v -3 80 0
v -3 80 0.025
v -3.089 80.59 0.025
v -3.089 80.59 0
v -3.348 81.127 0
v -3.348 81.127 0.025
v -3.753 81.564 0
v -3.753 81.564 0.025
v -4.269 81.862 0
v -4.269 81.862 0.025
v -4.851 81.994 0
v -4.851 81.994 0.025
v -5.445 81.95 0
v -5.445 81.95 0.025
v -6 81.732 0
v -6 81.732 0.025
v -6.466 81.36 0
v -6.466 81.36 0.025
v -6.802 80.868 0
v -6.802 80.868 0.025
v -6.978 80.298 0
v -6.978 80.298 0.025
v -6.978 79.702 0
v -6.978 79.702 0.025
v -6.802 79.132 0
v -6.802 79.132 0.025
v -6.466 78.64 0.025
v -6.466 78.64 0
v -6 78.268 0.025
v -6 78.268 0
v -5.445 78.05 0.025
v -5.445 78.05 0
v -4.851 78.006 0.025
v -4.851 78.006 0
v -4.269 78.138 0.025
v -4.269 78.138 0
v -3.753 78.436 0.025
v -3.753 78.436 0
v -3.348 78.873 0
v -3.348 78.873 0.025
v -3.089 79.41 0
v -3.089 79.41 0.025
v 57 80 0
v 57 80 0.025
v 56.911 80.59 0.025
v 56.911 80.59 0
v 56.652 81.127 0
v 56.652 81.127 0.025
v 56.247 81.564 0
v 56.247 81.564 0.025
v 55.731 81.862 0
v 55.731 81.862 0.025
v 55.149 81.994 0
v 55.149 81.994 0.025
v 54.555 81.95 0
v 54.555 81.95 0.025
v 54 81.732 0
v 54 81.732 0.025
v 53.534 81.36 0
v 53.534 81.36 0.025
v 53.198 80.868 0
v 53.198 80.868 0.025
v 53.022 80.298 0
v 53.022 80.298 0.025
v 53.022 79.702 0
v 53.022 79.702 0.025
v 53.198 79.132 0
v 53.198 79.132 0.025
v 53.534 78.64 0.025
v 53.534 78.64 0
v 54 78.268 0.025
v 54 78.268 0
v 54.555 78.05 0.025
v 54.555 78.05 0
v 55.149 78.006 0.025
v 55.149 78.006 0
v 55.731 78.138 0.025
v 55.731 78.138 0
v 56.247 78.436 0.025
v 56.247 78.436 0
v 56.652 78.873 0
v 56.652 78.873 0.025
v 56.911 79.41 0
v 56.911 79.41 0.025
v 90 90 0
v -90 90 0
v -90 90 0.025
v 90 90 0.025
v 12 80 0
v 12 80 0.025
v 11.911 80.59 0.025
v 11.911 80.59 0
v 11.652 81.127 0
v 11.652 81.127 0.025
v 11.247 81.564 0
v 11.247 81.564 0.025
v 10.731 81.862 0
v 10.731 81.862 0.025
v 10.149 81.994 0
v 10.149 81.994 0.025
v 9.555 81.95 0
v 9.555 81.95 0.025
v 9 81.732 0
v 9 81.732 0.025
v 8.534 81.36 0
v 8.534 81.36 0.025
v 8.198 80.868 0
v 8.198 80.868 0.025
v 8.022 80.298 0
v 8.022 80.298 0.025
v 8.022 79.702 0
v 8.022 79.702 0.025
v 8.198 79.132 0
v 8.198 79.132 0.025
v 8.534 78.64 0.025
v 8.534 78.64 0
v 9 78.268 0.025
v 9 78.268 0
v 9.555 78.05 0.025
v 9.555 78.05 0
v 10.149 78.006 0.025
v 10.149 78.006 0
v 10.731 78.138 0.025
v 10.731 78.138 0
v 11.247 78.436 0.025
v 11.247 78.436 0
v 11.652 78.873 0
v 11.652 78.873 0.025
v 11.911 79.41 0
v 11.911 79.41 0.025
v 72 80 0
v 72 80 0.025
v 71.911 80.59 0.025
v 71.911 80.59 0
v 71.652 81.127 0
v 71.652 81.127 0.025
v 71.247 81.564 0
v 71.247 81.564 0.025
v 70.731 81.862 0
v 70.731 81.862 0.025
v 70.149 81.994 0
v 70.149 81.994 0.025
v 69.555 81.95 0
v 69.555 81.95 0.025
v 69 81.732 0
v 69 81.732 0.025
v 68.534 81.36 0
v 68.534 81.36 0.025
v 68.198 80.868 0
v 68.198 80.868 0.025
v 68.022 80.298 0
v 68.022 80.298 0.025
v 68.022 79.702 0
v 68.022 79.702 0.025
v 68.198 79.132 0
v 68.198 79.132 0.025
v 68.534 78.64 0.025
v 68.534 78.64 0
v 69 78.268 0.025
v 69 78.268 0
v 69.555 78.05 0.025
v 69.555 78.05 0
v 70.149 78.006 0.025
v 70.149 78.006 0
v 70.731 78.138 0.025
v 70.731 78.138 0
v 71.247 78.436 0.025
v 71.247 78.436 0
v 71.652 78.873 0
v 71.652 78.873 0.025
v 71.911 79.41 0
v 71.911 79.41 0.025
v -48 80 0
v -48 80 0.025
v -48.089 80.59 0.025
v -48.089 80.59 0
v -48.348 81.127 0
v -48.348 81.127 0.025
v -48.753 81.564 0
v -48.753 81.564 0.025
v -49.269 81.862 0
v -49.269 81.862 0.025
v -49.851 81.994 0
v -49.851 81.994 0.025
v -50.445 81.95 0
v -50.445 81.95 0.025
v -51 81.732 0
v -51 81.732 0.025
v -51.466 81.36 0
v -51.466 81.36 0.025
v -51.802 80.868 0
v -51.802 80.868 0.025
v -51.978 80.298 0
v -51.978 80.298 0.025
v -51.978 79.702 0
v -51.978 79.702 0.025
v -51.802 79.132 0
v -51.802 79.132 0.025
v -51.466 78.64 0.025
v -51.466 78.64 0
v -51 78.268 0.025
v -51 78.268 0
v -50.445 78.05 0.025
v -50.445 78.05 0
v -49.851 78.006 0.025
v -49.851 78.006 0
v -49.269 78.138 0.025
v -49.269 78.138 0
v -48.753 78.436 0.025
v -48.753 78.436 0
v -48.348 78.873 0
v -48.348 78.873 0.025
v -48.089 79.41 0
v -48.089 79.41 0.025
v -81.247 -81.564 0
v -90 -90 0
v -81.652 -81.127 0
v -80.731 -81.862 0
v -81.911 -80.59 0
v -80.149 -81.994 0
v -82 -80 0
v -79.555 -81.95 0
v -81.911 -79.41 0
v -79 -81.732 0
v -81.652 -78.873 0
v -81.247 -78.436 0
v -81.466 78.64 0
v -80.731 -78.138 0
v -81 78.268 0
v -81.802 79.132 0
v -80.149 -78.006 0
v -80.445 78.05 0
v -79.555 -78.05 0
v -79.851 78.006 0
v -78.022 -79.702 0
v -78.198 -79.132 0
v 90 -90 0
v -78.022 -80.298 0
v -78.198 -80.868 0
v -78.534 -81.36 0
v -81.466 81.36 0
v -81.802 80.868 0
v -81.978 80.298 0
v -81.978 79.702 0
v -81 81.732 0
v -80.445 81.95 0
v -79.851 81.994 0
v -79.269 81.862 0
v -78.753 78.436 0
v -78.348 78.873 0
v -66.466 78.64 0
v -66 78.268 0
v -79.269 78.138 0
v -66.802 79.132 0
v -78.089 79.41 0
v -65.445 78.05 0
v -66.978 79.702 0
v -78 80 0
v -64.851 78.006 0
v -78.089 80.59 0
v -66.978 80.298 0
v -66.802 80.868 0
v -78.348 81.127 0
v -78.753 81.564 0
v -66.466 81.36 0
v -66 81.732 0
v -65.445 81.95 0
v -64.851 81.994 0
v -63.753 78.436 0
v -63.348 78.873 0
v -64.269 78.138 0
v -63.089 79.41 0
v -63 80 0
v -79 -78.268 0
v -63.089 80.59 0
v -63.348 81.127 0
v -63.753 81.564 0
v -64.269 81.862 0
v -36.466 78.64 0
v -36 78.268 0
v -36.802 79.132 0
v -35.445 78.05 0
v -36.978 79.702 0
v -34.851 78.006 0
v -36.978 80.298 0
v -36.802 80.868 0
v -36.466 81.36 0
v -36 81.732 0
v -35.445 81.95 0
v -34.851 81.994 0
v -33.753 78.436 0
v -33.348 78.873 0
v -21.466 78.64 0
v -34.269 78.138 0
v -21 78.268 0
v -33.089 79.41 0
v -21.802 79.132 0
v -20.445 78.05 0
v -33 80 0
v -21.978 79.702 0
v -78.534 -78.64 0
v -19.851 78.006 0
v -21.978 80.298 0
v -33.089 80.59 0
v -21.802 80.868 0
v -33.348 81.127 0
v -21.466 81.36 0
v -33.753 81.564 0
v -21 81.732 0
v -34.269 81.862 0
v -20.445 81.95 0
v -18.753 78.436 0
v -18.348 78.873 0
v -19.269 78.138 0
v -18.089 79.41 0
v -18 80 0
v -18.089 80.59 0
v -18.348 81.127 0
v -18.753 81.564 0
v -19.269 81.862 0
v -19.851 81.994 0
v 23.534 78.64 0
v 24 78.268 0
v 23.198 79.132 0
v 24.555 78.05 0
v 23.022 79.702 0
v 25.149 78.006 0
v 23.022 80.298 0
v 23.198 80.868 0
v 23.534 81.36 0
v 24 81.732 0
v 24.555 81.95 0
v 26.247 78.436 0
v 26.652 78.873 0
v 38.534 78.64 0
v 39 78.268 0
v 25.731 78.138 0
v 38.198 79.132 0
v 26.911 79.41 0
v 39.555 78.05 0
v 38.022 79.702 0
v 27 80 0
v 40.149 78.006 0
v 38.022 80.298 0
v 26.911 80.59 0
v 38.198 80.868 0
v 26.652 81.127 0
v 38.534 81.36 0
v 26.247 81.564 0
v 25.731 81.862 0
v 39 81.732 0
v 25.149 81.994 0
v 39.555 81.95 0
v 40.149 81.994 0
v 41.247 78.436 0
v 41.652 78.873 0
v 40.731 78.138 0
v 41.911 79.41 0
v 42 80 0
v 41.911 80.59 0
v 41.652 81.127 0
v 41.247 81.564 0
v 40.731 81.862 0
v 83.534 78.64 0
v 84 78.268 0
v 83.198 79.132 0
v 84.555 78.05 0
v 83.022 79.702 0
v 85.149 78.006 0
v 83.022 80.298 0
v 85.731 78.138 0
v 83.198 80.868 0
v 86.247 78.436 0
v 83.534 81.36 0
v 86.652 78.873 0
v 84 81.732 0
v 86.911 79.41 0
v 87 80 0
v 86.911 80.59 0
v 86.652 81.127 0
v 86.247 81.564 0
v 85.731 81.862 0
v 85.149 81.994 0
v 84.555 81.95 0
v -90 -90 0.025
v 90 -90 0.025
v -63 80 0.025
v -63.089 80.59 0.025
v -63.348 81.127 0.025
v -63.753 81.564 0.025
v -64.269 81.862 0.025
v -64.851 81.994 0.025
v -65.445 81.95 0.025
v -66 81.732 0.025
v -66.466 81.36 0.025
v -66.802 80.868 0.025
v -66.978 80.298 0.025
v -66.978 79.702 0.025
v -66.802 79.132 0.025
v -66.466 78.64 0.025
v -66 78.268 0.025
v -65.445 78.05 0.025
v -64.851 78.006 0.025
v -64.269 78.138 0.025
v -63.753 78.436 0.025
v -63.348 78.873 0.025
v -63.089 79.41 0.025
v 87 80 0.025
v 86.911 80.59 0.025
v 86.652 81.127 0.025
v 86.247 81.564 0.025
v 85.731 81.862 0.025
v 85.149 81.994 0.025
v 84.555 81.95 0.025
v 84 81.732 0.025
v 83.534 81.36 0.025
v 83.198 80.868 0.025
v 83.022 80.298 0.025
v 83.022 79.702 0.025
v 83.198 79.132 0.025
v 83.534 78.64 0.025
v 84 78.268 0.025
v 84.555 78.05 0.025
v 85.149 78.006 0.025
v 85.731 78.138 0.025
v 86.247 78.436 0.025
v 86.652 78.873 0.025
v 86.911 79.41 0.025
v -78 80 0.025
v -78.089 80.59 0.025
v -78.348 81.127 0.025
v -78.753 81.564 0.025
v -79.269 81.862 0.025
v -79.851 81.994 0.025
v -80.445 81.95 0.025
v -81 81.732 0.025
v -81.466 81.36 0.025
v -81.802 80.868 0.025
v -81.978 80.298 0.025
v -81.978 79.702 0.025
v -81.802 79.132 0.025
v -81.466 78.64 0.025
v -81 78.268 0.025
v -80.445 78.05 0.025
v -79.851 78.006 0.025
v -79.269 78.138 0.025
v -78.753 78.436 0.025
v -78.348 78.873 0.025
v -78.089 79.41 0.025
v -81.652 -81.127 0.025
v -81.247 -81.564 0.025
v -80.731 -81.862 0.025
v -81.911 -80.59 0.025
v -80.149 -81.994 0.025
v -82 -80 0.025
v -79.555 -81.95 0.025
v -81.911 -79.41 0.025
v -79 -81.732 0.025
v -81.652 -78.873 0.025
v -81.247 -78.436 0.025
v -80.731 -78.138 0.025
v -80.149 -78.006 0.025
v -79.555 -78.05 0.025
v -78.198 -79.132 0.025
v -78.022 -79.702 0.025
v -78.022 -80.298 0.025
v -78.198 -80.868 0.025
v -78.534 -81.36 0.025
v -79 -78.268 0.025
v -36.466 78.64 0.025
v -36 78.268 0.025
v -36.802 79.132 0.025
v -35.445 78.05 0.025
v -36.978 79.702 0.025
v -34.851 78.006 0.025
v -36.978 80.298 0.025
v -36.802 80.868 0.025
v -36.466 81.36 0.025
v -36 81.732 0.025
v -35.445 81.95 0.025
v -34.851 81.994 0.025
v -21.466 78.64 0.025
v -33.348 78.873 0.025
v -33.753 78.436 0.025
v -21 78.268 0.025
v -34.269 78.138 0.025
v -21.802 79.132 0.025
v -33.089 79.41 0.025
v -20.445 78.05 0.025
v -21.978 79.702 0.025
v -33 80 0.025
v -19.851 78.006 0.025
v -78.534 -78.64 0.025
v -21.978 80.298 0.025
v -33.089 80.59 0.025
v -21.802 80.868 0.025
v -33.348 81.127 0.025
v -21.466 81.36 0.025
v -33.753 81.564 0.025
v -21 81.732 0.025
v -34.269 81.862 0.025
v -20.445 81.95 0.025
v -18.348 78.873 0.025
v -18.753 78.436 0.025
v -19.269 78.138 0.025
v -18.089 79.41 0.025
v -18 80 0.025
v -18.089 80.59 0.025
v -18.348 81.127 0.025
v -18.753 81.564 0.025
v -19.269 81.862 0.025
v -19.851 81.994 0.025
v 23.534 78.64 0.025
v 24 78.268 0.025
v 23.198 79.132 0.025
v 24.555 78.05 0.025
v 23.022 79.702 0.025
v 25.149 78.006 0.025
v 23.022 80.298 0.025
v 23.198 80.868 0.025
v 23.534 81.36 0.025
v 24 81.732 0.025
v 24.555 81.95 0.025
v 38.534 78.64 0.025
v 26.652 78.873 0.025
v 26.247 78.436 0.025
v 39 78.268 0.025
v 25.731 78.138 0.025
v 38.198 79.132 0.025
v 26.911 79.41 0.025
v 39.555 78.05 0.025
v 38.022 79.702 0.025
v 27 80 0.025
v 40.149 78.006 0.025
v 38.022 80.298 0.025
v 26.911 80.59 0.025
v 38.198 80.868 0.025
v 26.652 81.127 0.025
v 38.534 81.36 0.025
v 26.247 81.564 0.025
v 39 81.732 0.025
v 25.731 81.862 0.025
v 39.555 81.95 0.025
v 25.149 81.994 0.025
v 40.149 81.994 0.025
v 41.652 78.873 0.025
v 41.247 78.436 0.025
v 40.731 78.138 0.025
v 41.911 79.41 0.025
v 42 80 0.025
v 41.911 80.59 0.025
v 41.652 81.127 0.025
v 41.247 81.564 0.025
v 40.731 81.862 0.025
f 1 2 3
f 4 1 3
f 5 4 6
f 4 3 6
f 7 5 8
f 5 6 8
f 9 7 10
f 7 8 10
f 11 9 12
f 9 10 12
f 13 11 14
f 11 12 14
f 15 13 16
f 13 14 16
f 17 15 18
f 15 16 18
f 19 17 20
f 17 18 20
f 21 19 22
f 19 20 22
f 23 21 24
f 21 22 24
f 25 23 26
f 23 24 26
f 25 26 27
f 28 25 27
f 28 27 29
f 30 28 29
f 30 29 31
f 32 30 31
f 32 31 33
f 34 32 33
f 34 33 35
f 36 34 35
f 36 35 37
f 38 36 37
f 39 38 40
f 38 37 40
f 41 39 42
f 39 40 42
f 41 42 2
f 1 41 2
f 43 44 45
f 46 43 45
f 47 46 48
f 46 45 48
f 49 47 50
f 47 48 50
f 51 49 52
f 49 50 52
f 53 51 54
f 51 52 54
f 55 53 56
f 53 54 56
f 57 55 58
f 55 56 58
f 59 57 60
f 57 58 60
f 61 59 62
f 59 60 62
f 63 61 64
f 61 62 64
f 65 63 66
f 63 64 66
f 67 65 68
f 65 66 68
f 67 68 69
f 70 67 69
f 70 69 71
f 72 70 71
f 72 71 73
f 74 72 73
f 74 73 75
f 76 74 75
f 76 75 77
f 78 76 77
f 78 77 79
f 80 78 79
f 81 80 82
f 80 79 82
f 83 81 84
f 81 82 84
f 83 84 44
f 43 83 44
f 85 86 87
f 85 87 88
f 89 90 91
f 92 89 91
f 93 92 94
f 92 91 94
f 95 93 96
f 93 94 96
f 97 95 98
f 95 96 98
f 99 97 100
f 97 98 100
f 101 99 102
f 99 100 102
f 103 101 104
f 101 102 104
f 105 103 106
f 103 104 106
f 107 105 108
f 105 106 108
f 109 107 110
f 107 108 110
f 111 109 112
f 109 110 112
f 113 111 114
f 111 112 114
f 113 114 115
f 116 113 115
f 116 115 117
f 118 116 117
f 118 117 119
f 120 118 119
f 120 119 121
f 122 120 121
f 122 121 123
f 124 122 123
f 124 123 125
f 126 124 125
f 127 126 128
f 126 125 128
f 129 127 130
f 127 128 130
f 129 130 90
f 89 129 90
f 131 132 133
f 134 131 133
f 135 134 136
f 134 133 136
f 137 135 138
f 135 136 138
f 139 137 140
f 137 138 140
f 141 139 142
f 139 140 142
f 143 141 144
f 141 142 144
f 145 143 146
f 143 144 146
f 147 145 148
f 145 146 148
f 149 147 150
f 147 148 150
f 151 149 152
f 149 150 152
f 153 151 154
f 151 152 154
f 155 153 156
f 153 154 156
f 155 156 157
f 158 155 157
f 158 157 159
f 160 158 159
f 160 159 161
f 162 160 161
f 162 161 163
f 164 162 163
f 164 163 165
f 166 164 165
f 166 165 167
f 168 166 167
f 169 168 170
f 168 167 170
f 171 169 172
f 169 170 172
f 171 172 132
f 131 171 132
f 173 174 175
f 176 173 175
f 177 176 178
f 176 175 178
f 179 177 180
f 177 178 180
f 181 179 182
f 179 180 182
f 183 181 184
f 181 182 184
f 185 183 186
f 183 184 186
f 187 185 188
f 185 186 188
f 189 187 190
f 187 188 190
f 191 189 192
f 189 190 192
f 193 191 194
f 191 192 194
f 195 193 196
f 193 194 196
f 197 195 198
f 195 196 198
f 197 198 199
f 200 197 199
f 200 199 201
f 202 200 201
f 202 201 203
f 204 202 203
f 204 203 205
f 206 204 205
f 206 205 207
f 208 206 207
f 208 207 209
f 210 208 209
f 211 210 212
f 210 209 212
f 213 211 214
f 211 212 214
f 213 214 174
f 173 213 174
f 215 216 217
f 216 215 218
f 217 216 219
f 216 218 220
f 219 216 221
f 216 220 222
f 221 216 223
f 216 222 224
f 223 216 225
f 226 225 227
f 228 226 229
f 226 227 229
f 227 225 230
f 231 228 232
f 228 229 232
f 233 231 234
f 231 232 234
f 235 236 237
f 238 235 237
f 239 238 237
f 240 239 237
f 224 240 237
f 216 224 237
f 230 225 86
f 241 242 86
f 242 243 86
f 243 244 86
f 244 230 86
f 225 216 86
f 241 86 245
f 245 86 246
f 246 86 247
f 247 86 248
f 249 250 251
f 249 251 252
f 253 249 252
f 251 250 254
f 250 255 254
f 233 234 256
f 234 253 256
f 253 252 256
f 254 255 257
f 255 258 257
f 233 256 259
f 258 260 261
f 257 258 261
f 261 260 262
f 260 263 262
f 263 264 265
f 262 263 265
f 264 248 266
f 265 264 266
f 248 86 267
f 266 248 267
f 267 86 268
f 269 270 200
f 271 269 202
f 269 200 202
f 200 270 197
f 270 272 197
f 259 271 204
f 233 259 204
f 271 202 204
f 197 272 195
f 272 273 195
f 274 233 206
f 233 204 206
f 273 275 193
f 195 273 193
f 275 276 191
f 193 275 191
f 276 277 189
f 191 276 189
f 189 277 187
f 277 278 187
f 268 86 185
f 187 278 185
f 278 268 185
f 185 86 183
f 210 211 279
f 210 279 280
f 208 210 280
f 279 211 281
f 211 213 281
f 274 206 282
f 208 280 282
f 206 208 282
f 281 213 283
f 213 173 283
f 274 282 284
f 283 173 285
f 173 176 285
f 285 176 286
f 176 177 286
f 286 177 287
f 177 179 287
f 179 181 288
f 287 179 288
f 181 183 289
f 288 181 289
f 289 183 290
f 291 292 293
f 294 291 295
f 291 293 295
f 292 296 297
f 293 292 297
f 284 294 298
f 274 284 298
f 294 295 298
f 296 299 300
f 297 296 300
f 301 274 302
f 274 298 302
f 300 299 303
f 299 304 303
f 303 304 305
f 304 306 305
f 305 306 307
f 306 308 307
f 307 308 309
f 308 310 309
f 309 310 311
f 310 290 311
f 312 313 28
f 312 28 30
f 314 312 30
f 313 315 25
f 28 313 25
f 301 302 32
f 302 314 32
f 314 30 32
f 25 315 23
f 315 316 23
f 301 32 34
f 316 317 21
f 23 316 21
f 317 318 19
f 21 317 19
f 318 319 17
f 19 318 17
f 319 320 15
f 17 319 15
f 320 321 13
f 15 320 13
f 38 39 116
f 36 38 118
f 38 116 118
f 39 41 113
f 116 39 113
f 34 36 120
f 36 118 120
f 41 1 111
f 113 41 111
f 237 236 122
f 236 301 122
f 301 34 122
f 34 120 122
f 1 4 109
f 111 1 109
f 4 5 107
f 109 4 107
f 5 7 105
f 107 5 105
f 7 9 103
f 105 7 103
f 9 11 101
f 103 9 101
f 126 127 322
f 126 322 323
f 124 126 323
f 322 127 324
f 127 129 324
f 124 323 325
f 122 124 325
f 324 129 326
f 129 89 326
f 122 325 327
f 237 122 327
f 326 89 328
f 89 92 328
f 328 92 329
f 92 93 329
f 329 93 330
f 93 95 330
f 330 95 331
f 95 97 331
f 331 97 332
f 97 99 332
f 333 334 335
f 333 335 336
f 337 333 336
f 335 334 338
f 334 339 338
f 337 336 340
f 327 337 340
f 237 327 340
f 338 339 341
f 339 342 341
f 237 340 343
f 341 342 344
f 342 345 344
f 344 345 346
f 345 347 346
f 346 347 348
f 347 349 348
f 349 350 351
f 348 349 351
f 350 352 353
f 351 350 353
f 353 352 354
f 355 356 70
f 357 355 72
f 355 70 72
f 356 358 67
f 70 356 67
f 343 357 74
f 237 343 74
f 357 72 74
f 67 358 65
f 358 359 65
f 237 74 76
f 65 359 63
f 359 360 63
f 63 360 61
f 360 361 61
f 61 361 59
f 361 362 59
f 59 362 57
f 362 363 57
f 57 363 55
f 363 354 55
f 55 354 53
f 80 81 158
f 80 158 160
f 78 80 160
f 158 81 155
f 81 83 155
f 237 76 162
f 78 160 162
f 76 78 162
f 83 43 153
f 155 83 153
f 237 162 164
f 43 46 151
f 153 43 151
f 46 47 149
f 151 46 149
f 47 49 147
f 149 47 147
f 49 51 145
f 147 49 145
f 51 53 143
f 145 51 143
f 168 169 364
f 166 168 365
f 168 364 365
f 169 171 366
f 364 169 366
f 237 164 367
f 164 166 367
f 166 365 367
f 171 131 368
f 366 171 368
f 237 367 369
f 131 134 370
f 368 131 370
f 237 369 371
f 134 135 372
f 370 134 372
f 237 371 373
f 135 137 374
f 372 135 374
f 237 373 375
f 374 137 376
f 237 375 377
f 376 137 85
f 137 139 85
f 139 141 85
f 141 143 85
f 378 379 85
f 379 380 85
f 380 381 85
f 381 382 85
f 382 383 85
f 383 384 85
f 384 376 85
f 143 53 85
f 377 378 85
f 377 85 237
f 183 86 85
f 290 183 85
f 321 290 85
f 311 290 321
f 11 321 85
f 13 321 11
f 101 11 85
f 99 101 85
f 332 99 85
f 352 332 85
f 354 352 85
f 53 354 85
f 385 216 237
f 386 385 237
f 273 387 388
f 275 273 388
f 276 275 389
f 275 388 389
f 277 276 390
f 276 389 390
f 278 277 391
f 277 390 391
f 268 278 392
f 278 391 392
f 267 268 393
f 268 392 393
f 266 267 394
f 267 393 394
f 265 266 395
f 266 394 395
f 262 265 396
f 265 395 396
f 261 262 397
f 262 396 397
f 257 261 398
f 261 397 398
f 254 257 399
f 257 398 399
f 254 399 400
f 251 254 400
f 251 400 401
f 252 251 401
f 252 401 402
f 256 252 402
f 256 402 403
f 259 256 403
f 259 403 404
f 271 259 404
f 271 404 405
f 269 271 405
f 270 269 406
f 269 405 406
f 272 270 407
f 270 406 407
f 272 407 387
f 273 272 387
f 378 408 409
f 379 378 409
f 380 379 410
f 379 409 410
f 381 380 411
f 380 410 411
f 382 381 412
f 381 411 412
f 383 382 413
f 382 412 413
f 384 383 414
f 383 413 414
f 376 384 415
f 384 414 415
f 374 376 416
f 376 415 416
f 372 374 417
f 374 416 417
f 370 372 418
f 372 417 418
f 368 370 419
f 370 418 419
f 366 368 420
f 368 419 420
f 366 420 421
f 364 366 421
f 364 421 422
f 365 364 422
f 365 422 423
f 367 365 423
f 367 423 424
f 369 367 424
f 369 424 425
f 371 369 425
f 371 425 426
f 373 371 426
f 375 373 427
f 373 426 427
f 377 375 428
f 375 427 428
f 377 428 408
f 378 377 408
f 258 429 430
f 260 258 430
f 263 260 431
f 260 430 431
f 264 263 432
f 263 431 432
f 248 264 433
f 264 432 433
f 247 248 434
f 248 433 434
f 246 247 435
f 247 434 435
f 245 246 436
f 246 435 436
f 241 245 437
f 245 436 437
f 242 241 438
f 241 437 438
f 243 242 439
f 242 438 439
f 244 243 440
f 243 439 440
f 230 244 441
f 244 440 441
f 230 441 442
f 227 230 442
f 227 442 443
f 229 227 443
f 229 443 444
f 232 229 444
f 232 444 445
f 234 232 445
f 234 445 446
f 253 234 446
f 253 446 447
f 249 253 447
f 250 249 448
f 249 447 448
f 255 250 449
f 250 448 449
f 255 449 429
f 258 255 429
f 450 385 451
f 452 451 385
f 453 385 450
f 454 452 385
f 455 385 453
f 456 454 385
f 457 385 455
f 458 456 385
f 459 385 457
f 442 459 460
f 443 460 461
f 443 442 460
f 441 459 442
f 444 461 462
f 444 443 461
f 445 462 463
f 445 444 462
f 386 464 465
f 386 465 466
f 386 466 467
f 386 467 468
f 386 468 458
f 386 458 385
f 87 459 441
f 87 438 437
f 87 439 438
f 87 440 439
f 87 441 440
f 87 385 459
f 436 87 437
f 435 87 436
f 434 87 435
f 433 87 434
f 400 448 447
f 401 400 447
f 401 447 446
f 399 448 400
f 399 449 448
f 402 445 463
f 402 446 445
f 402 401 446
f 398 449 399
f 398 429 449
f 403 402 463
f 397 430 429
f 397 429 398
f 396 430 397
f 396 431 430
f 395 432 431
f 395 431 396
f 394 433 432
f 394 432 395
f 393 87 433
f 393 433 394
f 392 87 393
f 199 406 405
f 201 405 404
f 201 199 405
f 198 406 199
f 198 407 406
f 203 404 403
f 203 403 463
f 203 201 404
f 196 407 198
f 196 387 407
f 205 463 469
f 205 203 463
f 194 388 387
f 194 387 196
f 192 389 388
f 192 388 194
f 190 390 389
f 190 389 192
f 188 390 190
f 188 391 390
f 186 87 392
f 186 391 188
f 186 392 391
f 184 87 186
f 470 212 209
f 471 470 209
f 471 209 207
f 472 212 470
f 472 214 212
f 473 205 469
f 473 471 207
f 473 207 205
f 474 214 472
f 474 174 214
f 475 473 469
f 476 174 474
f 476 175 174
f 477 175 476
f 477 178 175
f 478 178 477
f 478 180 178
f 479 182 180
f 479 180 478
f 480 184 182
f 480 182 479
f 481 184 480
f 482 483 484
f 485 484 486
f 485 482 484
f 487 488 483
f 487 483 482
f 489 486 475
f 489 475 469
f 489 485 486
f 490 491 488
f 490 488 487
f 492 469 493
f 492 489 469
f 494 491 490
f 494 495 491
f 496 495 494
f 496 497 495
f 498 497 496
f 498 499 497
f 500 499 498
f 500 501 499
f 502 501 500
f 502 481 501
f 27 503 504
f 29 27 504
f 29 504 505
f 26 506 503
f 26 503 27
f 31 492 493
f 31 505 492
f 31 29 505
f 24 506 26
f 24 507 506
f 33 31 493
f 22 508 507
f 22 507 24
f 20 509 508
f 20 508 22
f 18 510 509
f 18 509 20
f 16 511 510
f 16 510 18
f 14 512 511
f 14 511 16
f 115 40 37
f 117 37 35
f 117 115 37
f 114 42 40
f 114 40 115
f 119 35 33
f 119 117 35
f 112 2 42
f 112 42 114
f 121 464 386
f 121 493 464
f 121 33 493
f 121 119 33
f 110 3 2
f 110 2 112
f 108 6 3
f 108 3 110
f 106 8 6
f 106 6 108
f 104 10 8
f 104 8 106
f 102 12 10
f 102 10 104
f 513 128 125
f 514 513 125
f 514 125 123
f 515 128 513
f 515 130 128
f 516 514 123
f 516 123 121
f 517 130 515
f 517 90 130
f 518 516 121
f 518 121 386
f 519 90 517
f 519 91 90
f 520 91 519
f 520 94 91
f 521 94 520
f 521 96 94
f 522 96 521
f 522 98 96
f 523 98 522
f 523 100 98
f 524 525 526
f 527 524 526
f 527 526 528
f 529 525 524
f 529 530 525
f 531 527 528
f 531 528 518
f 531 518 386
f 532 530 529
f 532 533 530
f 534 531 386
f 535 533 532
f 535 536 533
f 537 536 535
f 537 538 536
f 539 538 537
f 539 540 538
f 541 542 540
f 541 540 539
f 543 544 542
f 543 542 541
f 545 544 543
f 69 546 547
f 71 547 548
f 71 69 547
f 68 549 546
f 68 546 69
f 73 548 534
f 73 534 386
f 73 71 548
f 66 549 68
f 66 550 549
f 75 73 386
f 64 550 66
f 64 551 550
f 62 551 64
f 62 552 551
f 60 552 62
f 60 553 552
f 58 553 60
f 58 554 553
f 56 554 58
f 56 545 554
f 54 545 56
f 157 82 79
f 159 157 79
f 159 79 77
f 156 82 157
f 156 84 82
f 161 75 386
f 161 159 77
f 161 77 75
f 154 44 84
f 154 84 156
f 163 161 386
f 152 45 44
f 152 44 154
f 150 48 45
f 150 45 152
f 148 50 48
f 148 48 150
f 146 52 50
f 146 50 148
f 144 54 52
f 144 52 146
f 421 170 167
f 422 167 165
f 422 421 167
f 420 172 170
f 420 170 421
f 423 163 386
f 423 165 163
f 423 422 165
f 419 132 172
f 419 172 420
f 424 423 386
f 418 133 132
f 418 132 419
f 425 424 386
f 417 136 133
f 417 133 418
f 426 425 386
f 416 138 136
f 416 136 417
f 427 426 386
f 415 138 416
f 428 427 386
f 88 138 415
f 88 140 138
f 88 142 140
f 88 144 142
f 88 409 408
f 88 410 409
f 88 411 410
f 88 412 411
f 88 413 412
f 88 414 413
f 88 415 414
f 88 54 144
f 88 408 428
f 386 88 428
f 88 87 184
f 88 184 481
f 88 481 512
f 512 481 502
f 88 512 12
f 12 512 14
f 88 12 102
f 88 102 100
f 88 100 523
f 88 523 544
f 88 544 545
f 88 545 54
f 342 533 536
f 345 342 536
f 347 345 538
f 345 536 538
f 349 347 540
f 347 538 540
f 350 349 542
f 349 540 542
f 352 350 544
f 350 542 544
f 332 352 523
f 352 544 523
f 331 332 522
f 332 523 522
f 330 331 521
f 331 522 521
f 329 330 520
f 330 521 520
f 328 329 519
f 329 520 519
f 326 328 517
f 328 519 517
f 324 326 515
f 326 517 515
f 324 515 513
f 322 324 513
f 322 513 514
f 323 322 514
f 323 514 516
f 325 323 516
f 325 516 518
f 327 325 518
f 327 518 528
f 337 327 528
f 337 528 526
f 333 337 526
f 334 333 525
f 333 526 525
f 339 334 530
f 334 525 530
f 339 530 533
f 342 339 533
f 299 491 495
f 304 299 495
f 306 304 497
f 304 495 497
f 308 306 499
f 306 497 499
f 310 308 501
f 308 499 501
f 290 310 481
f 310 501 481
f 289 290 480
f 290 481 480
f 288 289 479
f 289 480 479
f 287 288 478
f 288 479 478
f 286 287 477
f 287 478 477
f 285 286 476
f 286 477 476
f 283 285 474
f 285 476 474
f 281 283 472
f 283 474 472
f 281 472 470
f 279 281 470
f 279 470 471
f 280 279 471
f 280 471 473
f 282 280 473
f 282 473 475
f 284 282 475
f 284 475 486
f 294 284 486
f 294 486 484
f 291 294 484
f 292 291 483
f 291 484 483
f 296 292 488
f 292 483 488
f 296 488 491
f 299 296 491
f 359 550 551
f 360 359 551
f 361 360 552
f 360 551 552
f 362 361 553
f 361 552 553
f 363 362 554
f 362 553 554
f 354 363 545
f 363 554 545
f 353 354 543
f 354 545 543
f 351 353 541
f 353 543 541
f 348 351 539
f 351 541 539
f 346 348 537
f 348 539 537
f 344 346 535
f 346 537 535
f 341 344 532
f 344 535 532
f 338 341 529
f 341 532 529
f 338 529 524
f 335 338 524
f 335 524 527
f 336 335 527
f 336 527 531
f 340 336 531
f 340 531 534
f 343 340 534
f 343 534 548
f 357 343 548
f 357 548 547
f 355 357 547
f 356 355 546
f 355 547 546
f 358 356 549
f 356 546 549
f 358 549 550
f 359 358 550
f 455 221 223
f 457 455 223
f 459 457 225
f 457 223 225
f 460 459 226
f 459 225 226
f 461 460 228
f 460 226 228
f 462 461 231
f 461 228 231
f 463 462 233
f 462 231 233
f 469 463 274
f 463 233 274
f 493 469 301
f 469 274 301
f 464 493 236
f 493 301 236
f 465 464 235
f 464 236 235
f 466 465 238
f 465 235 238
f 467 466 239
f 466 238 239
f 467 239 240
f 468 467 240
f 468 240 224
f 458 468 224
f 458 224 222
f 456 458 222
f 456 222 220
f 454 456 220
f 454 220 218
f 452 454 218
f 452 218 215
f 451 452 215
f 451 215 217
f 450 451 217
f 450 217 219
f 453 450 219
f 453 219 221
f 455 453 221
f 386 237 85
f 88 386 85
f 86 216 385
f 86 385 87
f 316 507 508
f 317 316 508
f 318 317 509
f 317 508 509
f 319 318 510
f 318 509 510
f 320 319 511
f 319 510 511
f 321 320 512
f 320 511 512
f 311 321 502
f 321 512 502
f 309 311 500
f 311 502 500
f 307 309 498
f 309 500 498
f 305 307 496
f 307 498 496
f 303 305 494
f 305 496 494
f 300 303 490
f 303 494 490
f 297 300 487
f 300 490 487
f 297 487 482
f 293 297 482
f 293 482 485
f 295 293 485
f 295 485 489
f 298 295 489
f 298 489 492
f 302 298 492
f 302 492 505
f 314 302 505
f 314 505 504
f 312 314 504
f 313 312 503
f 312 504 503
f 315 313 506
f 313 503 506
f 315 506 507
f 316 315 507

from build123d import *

# Parameters (mm, degrees)
F0_W     = 180
F0_H     = 180
F1_DEPTH = 0.025
F3_D     = 4
F4_R     = 2
F5_DEPTH = 0.025


with BuildPart() as f1:
    # F0 (on Top) → F1 (new body)
    with BuildSketch(Plane.XY):
        Rectangle(F0_W, F0_H)
    extrude(amount=F1_DEPTH)

    # F3 (through all)
    with Locations(Plane.XY.offset(0.025)):
        with Locations((-80, -80)):
            Hole(F3_D / 2)

    # F4 (on face) → F5 (cut, through all)
    with BuildSketch(Plane.XY.offset(0.025)):
        with Locations((-80, 80)):
            Circle(F4_R)
        with Locations((-65, 80)):
            Circle(F4_R)
        with Locations((-50, 80)):
            Circle(F4_R)
        with Locations((-35, 80)):
            Circle(F4_R)
        with Locations((-20, 80)):
            Circle(F4_R)
        with Locations((-5, 80)):
            Circle(F4_R)
        with Locations((10, 80)):
            Circle(F4_R)
        with Locations((25, 80)):
            Circle(F4_R)
        with Locations((40, 80)):
            Circle(F4_R)
        with Locations((55, 80)):
            Circle(F4_R)
        with Locations((70, 80)):
            Circle(F4_R)
        with Locations((85, 80)):
            Circle(F4_R)
    extrude(amount=-F5_DEPTH, mode=Mode.SUBTRACT)


solid = f1.part
